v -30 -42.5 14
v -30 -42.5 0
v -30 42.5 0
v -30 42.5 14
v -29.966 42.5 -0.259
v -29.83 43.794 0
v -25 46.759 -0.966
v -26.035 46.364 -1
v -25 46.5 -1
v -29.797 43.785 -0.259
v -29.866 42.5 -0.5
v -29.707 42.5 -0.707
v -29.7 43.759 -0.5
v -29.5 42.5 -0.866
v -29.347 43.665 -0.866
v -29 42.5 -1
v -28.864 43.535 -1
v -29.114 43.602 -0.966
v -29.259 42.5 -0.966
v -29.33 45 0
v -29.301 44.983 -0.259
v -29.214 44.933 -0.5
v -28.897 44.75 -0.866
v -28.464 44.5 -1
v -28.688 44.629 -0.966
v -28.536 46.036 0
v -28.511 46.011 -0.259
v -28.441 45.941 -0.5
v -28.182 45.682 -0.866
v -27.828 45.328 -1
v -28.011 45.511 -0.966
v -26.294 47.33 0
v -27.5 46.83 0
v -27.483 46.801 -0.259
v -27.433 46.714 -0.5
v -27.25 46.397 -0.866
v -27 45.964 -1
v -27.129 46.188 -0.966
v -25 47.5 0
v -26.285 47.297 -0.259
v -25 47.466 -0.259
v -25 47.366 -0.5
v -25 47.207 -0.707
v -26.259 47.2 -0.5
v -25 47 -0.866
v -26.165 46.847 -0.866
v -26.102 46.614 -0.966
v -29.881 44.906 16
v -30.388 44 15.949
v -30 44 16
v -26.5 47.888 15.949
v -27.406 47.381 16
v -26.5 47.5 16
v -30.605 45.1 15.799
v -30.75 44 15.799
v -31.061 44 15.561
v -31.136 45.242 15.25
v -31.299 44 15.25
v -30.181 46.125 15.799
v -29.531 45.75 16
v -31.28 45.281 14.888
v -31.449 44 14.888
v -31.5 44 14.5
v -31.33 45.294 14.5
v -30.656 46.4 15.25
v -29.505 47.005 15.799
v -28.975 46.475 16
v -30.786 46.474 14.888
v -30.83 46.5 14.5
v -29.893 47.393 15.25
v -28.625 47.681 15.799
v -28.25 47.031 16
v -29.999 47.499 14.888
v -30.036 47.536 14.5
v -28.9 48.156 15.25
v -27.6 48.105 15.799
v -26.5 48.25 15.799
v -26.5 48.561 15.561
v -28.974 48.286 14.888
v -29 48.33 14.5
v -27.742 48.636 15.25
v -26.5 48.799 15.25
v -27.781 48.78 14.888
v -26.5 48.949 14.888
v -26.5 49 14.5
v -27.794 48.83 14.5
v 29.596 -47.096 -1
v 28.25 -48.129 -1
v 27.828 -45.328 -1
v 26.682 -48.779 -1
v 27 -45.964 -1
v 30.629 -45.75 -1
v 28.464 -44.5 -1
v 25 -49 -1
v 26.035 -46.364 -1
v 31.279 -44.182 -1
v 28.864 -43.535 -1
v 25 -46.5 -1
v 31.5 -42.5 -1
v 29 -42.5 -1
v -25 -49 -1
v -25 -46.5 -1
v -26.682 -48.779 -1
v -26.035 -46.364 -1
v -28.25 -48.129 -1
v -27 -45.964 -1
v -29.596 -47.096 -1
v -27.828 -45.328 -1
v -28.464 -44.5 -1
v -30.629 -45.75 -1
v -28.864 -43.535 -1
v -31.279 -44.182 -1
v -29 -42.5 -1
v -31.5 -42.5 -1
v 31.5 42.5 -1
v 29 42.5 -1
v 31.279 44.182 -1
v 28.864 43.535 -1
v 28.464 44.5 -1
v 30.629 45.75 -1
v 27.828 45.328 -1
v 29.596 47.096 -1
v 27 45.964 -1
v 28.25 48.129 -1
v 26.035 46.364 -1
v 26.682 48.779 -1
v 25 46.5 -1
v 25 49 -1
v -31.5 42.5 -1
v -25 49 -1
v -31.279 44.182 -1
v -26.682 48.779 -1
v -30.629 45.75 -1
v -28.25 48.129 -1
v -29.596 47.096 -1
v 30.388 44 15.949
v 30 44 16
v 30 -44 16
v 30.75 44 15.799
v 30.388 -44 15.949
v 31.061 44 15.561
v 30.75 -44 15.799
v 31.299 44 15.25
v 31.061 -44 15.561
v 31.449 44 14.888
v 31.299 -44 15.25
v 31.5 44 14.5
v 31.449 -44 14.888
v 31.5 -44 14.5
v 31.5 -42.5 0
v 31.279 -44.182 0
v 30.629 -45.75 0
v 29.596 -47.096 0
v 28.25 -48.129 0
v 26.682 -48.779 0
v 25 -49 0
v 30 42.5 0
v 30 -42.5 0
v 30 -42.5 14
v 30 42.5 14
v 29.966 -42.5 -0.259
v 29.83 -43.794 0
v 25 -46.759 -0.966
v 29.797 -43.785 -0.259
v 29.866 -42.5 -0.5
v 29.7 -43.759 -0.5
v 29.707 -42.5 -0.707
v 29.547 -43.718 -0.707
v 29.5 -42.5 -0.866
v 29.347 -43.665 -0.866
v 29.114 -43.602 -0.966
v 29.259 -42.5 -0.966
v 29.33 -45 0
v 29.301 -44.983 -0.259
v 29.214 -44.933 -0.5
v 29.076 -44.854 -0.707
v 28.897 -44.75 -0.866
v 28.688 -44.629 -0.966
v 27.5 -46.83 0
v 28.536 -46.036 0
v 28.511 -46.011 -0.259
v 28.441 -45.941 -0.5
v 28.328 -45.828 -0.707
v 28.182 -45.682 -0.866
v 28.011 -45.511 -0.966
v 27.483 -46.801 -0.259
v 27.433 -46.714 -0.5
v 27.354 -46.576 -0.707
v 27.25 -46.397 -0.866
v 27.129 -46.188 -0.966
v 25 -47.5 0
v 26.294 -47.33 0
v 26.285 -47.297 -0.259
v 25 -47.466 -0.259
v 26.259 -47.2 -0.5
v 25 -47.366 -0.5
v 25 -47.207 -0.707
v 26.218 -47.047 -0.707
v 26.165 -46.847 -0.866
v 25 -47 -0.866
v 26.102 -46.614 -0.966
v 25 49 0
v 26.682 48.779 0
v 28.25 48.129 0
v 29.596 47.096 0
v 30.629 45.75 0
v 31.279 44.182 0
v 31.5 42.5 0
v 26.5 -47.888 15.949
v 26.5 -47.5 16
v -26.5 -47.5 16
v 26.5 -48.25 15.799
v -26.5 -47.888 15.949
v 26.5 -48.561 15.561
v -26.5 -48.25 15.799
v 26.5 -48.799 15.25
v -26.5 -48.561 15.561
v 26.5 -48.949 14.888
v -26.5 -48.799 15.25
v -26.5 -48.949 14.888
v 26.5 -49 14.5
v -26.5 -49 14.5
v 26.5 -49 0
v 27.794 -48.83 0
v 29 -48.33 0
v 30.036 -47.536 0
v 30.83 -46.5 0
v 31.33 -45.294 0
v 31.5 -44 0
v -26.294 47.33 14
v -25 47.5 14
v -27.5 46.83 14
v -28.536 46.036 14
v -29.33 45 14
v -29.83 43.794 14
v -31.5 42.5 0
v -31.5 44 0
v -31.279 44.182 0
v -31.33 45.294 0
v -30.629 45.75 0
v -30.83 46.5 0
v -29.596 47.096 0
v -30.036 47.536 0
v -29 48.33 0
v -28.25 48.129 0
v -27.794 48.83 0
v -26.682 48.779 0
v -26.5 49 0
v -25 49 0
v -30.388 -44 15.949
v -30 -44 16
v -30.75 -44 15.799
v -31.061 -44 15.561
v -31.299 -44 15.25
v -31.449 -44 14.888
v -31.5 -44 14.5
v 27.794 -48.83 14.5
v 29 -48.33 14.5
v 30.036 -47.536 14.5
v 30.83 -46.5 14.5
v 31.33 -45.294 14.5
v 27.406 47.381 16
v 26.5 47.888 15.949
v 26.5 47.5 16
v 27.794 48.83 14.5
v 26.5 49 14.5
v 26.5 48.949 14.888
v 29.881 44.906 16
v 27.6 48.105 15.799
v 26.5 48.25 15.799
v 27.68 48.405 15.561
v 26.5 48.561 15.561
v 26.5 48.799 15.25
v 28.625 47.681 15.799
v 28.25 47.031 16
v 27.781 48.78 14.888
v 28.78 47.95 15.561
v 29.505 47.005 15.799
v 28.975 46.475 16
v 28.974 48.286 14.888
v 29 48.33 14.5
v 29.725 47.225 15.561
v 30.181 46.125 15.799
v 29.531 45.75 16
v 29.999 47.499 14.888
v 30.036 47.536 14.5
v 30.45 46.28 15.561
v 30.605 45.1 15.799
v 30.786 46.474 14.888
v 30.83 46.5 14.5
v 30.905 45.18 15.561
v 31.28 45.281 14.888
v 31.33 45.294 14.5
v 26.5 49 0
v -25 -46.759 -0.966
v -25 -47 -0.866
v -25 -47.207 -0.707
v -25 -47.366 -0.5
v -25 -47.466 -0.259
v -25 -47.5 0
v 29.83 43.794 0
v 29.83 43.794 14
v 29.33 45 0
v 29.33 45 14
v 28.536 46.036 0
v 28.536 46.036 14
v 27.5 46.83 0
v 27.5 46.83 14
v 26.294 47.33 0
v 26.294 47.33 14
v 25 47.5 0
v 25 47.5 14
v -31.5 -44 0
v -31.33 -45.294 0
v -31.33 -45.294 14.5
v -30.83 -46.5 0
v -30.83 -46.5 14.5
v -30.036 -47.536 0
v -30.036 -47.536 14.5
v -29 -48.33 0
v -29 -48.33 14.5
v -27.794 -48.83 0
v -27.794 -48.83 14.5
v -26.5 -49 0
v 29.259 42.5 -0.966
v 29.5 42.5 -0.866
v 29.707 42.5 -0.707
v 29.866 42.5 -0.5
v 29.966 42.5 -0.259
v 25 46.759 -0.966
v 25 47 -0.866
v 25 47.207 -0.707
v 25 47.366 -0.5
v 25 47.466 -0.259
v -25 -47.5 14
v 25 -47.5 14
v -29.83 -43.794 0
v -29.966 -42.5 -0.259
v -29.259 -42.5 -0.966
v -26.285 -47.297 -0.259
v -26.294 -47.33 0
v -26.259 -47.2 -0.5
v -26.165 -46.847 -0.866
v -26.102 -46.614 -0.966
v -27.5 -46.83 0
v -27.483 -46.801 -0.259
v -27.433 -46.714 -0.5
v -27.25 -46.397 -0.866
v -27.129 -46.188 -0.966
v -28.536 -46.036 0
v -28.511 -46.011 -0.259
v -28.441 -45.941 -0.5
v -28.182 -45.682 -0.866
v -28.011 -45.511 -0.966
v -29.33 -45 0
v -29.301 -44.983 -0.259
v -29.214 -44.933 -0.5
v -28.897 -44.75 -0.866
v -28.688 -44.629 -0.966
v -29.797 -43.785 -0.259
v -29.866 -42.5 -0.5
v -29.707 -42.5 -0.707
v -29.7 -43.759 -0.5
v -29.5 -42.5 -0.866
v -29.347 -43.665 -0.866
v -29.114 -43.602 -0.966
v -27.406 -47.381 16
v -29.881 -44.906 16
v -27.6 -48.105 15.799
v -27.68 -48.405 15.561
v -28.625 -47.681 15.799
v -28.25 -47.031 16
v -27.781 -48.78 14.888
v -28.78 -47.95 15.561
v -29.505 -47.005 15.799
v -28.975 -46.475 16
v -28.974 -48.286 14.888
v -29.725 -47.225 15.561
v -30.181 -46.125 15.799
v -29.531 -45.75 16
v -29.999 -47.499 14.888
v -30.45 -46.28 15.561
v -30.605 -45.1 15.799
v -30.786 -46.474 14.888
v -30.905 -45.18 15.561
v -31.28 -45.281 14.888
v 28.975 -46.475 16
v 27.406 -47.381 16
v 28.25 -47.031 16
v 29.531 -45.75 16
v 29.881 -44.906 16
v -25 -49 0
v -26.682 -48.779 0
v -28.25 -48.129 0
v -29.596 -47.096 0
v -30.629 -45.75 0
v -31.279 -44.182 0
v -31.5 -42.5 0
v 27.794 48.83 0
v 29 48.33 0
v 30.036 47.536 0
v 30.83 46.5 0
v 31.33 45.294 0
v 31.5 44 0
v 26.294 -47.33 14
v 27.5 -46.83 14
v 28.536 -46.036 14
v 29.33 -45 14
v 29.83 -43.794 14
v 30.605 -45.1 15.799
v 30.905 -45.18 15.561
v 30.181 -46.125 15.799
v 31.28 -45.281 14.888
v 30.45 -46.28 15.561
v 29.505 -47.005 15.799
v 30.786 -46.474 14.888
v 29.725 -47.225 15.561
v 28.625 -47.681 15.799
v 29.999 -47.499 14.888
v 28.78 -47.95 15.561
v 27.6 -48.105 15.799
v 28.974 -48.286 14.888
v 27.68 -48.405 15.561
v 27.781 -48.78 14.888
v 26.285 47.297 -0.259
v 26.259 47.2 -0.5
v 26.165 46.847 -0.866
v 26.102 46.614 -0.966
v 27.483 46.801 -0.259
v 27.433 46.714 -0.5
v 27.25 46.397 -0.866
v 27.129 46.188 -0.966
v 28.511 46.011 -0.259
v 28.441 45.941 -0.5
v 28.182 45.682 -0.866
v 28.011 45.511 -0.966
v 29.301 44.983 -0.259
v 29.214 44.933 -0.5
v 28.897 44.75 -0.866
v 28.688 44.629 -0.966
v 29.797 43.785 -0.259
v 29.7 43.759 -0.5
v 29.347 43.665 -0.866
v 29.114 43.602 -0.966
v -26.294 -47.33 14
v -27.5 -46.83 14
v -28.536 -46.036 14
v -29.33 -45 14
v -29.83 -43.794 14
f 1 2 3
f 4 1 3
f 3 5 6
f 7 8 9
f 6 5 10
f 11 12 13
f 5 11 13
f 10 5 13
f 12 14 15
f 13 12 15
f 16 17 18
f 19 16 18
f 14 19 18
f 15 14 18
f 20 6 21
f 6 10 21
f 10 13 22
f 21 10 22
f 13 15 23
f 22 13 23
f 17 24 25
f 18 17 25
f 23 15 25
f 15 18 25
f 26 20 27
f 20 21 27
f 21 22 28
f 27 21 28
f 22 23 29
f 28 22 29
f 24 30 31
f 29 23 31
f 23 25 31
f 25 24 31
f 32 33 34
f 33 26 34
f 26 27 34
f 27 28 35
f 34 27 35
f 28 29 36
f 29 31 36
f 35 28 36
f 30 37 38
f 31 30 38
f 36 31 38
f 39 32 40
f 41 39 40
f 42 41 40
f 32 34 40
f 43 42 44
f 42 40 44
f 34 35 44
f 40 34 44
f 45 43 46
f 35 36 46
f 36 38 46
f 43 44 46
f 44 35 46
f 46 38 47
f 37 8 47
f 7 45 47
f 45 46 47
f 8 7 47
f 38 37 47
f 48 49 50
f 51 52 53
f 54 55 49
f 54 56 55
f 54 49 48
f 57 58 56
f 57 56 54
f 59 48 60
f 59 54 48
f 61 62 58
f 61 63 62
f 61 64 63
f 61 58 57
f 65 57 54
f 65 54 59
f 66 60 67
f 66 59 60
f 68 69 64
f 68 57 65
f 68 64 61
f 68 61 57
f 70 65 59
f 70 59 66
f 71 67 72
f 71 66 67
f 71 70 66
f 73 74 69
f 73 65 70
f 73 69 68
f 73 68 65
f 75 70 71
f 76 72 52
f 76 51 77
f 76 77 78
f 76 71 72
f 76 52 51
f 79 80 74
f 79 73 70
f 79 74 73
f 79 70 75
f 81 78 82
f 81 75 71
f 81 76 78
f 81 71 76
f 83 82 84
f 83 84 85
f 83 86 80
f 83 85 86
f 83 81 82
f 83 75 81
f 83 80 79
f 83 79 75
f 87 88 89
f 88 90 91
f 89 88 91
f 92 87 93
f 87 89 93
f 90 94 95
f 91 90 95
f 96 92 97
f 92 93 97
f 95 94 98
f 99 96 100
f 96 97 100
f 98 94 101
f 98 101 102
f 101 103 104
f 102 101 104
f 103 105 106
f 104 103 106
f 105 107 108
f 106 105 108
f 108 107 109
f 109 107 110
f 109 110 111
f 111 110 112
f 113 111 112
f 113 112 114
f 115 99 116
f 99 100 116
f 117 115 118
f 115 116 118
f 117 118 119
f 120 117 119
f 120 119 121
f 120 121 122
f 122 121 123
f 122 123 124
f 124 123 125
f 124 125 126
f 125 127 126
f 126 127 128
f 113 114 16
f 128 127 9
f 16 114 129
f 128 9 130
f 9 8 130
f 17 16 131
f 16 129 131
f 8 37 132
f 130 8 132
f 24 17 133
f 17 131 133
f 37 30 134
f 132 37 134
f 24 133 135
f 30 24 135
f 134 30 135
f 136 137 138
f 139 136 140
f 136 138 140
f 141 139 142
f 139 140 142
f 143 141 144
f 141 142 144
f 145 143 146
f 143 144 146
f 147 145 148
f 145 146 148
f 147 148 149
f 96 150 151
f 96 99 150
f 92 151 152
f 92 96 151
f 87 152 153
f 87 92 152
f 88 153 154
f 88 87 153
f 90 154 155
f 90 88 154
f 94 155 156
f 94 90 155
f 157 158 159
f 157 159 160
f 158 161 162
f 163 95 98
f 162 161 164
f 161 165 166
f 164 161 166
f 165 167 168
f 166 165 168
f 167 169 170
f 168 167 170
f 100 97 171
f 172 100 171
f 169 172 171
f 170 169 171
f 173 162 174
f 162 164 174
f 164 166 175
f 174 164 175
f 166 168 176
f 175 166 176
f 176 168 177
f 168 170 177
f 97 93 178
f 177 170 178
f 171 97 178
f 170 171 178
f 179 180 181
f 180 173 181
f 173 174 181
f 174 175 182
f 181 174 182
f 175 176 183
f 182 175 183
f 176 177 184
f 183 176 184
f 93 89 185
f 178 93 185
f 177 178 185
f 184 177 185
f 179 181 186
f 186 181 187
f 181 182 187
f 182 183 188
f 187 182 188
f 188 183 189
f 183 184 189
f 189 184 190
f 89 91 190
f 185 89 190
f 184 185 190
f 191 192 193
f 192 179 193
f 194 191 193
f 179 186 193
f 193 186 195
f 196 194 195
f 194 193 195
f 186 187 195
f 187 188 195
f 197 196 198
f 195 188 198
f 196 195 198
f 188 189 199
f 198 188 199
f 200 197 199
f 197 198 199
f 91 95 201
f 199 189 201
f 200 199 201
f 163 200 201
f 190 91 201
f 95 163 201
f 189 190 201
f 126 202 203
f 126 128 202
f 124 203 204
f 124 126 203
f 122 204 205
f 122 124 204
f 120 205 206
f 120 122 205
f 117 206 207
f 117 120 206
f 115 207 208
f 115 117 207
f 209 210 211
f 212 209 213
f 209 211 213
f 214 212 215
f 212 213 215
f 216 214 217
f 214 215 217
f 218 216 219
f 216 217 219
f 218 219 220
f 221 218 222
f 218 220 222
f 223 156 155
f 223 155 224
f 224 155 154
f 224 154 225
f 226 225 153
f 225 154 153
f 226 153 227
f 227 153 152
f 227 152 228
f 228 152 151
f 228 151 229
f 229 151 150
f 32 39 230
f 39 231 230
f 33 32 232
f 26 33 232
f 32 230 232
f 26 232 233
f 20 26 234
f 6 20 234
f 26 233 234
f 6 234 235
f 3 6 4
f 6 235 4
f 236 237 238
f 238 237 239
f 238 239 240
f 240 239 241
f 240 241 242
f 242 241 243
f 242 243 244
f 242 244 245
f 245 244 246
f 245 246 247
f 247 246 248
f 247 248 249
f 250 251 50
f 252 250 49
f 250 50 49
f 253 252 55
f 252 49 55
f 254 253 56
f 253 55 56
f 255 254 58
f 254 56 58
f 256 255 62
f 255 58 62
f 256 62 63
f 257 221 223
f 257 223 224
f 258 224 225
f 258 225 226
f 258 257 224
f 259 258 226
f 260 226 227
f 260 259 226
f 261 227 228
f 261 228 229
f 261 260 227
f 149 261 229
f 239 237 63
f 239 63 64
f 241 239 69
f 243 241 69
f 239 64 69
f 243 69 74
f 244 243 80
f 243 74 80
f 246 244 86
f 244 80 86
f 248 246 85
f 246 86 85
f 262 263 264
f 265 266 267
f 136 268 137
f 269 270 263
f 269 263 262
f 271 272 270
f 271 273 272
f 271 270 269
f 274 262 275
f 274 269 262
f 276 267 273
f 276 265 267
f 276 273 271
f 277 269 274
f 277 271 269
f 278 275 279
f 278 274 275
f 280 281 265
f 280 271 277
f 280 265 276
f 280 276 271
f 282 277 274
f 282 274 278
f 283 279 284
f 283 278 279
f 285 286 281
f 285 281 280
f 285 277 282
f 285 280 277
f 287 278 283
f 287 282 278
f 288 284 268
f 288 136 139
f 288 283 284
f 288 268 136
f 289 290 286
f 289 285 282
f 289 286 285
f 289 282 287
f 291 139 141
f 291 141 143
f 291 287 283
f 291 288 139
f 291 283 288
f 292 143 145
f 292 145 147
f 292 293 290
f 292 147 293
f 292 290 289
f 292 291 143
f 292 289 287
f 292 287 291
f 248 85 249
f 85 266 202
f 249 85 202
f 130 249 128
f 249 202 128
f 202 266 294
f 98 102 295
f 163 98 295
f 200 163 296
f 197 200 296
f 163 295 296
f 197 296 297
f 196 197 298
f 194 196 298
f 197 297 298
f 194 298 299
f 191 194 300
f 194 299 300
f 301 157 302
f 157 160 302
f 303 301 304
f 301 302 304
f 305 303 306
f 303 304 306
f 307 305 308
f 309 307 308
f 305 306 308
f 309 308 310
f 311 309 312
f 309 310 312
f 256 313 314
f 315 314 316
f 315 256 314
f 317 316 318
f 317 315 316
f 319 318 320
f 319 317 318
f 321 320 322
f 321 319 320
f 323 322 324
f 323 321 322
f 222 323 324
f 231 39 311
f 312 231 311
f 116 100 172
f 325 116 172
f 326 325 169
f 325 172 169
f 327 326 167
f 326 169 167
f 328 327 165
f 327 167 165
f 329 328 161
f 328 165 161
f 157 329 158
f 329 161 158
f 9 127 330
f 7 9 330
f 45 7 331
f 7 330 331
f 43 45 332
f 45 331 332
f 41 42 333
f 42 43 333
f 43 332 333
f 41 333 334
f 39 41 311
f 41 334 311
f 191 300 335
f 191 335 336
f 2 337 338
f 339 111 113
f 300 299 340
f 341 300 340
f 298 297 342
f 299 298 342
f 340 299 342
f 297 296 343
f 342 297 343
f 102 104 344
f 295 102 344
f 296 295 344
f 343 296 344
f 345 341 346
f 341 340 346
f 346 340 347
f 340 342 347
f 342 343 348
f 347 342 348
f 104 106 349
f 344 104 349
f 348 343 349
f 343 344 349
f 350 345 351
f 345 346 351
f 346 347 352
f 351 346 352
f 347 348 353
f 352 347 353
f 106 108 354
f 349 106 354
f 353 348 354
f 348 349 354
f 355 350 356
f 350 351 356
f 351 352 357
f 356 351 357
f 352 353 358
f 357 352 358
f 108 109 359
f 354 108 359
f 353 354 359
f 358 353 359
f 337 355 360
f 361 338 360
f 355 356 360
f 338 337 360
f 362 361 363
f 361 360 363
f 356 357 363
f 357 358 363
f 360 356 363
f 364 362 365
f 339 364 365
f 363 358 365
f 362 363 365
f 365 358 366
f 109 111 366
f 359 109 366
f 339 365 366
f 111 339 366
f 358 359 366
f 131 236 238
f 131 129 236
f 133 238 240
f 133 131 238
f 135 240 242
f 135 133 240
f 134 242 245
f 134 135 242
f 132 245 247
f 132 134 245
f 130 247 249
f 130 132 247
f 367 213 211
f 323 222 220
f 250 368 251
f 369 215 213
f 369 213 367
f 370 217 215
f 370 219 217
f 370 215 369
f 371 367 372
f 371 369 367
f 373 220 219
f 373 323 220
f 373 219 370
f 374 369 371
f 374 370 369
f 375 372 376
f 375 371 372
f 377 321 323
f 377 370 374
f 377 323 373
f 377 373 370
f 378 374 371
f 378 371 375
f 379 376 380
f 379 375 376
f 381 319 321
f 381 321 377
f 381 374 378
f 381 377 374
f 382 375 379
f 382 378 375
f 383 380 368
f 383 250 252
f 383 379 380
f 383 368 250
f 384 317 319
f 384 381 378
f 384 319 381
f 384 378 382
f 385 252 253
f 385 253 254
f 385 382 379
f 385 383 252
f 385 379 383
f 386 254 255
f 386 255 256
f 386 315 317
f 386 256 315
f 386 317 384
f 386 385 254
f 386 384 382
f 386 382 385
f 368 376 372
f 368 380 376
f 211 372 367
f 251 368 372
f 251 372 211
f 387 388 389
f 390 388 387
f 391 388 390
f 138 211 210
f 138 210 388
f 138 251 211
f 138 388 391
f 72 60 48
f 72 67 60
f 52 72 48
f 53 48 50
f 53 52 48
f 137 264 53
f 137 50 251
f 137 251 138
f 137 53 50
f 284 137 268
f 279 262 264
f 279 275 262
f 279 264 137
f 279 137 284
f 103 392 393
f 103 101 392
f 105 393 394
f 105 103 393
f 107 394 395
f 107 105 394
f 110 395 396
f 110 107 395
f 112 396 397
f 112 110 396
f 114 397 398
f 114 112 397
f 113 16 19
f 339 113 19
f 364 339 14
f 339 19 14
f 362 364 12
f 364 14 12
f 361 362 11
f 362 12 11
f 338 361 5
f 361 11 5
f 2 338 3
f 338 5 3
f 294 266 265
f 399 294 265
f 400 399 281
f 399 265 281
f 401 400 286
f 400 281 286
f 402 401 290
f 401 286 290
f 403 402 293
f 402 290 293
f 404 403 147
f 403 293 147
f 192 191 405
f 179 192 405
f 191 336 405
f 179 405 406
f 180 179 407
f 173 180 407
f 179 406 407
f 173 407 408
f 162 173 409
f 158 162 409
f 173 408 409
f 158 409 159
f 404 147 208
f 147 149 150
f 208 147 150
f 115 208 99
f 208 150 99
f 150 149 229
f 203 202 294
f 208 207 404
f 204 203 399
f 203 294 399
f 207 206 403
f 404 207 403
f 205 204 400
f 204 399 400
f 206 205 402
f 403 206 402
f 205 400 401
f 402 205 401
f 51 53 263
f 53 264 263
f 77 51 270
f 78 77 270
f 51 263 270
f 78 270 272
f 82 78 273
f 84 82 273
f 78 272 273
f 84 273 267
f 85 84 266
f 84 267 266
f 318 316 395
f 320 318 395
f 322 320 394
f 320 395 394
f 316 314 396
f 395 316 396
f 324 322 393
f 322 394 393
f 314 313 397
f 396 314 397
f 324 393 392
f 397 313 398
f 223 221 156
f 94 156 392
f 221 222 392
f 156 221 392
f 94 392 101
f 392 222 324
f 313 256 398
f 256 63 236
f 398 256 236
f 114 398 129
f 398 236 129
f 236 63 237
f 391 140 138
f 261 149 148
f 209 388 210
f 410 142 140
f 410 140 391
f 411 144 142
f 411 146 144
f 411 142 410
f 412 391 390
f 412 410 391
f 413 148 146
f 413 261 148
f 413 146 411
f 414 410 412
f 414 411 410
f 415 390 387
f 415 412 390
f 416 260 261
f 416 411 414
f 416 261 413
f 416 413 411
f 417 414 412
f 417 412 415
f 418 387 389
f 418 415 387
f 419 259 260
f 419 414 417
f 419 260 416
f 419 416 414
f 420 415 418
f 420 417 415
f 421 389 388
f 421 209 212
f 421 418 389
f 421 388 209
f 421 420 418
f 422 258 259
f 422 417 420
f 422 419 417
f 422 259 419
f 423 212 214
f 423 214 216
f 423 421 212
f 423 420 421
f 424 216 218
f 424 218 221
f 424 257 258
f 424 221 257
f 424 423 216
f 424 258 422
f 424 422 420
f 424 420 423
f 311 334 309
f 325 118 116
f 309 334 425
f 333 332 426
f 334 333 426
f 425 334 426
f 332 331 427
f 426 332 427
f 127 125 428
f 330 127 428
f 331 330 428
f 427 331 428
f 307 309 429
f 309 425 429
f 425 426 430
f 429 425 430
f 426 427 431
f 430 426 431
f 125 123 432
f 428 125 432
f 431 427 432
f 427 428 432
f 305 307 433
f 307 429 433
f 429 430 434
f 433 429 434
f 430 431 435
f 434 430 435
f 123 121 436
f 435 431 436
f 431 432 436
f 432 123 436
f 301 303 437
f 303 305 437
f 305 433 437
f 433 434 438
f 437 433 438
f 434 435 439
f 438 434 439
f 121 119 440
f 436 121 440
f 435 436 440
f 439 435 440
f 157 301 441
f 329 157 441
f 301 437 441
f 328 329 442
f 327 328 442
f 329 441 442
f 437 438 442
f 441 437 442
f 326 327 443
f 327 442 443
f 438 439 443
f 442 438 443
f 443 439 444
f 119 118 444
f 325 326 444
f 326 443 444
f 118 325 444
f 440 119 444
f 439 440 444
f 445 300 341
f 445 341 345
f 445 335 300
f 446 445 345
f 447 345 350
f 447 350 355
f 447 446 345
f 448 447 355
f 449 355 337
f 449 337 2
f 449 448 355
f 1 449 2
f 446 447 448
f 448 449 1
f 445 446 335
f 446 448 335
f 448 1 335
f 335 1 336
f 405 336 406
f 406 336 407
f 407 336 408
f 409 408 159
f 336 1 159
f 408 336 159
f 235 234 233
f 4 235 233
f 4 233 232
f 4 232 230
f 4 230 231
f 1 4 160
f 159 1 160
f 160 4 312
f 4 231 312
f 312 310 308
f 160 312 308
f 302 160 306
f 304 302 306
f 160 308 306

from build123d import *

# Parameters (mm, degrees)
F1_W     = 63.0000010133
F1_H     = 98.0000010133
F2_DEPTH = 16
F0_W     = 60
F0_H     = 95
F3_DEPTH = 14
F4_R     = 5
F5_R     = 1.5


with BuildPart() as f2:
    # F1 (on Top) → F2 (new body)
    with BuildSketch(Plane.XY):
        Rectangle(F1_W, F1_H)
    extrude(amount=F2_DEPTH)

    # F0 (on Top) → F3 (cut, through all)
    with BuildSketch(Plane.XY):
        Rectangle(F0_W, F0_H)
    extrude(amount=F3_DEPTH, mode=Mode.SUBTRACT)

    # F4
    f4_edges = [f2.edges().sort_by_distance(p)[0] for p in [
        (-30, 47.5, 7),
        (30, 47.5, 7),
        (31.500001, 49.000001, 8),
        (-31.500001, 49.000001, 8),
        (-31.500001, -49.000001, 8),
        (-30, -47.5, 7),
        (30, -47.5, 7),
        (31.500001, -49.000001, 8),
    ]]
    fillet(f4_edges, radius=F4_R)

    # F5
    f5_edges = [f2.edges().sort_by_distance(p)[0] for p in [
        (0, 49.000001, 16),
        (30.035534, 47.535534, 16),
        (-30.035534, 47.535534, 16),
        (31.500001, 0, 16),
        (-31.500001, 0, 16),
        (30.035534, -47.535534, 16),
        (-30.035534, -47.535534, 16),
        (0, -49.000001, 16),
    ]]
    fillet(f5_edges, radius=F5_R)

    # F8: sweep along a path in F6
    with BuildLine(Plane.XY) as f8_path:
        Line((25, -47.5), (-25, -47.5))
        ThreePointArc((-25, -47.5), (-28.5355339059, -46.0355339059), (-30, -42.5))
        Line((-30, -42.5), (-30, 42.5))
        ThreePointArc((-30, 42.5), (-28.5355339059, 46.0355339059), (-25, 47.5))
        Line((-25, 47.5), (25, 47.5))
        ThreePointArc((25, 47.5), (28.5355339059, 46.0355339059), (30, 42.5))
        Line((30, 42.5), (30, -42.5))
        ThreePointArc((30, -42.5), (28.5355339059, -46.0355339059), (25, -47.5))
    # F7 (on Front) → F8 (sweep)
    with BuildSketch(Plane.XZ):
        with BuildLine():
            ThreePointArc((-29, -1), (-29.7071067812, -0.7071067812), (-30, 0))
            Line((-30, 0), (-31.5000005066, 0))
            Line((-31.5000005066, 0), (-31.5000005066, -1))
            Line((-31.5000005066, -1), (-30, -1))
            Line((-30, -1), (-29, -1))
        make_face()
    sweep(path=f8_path.line)


solid = f2.part
